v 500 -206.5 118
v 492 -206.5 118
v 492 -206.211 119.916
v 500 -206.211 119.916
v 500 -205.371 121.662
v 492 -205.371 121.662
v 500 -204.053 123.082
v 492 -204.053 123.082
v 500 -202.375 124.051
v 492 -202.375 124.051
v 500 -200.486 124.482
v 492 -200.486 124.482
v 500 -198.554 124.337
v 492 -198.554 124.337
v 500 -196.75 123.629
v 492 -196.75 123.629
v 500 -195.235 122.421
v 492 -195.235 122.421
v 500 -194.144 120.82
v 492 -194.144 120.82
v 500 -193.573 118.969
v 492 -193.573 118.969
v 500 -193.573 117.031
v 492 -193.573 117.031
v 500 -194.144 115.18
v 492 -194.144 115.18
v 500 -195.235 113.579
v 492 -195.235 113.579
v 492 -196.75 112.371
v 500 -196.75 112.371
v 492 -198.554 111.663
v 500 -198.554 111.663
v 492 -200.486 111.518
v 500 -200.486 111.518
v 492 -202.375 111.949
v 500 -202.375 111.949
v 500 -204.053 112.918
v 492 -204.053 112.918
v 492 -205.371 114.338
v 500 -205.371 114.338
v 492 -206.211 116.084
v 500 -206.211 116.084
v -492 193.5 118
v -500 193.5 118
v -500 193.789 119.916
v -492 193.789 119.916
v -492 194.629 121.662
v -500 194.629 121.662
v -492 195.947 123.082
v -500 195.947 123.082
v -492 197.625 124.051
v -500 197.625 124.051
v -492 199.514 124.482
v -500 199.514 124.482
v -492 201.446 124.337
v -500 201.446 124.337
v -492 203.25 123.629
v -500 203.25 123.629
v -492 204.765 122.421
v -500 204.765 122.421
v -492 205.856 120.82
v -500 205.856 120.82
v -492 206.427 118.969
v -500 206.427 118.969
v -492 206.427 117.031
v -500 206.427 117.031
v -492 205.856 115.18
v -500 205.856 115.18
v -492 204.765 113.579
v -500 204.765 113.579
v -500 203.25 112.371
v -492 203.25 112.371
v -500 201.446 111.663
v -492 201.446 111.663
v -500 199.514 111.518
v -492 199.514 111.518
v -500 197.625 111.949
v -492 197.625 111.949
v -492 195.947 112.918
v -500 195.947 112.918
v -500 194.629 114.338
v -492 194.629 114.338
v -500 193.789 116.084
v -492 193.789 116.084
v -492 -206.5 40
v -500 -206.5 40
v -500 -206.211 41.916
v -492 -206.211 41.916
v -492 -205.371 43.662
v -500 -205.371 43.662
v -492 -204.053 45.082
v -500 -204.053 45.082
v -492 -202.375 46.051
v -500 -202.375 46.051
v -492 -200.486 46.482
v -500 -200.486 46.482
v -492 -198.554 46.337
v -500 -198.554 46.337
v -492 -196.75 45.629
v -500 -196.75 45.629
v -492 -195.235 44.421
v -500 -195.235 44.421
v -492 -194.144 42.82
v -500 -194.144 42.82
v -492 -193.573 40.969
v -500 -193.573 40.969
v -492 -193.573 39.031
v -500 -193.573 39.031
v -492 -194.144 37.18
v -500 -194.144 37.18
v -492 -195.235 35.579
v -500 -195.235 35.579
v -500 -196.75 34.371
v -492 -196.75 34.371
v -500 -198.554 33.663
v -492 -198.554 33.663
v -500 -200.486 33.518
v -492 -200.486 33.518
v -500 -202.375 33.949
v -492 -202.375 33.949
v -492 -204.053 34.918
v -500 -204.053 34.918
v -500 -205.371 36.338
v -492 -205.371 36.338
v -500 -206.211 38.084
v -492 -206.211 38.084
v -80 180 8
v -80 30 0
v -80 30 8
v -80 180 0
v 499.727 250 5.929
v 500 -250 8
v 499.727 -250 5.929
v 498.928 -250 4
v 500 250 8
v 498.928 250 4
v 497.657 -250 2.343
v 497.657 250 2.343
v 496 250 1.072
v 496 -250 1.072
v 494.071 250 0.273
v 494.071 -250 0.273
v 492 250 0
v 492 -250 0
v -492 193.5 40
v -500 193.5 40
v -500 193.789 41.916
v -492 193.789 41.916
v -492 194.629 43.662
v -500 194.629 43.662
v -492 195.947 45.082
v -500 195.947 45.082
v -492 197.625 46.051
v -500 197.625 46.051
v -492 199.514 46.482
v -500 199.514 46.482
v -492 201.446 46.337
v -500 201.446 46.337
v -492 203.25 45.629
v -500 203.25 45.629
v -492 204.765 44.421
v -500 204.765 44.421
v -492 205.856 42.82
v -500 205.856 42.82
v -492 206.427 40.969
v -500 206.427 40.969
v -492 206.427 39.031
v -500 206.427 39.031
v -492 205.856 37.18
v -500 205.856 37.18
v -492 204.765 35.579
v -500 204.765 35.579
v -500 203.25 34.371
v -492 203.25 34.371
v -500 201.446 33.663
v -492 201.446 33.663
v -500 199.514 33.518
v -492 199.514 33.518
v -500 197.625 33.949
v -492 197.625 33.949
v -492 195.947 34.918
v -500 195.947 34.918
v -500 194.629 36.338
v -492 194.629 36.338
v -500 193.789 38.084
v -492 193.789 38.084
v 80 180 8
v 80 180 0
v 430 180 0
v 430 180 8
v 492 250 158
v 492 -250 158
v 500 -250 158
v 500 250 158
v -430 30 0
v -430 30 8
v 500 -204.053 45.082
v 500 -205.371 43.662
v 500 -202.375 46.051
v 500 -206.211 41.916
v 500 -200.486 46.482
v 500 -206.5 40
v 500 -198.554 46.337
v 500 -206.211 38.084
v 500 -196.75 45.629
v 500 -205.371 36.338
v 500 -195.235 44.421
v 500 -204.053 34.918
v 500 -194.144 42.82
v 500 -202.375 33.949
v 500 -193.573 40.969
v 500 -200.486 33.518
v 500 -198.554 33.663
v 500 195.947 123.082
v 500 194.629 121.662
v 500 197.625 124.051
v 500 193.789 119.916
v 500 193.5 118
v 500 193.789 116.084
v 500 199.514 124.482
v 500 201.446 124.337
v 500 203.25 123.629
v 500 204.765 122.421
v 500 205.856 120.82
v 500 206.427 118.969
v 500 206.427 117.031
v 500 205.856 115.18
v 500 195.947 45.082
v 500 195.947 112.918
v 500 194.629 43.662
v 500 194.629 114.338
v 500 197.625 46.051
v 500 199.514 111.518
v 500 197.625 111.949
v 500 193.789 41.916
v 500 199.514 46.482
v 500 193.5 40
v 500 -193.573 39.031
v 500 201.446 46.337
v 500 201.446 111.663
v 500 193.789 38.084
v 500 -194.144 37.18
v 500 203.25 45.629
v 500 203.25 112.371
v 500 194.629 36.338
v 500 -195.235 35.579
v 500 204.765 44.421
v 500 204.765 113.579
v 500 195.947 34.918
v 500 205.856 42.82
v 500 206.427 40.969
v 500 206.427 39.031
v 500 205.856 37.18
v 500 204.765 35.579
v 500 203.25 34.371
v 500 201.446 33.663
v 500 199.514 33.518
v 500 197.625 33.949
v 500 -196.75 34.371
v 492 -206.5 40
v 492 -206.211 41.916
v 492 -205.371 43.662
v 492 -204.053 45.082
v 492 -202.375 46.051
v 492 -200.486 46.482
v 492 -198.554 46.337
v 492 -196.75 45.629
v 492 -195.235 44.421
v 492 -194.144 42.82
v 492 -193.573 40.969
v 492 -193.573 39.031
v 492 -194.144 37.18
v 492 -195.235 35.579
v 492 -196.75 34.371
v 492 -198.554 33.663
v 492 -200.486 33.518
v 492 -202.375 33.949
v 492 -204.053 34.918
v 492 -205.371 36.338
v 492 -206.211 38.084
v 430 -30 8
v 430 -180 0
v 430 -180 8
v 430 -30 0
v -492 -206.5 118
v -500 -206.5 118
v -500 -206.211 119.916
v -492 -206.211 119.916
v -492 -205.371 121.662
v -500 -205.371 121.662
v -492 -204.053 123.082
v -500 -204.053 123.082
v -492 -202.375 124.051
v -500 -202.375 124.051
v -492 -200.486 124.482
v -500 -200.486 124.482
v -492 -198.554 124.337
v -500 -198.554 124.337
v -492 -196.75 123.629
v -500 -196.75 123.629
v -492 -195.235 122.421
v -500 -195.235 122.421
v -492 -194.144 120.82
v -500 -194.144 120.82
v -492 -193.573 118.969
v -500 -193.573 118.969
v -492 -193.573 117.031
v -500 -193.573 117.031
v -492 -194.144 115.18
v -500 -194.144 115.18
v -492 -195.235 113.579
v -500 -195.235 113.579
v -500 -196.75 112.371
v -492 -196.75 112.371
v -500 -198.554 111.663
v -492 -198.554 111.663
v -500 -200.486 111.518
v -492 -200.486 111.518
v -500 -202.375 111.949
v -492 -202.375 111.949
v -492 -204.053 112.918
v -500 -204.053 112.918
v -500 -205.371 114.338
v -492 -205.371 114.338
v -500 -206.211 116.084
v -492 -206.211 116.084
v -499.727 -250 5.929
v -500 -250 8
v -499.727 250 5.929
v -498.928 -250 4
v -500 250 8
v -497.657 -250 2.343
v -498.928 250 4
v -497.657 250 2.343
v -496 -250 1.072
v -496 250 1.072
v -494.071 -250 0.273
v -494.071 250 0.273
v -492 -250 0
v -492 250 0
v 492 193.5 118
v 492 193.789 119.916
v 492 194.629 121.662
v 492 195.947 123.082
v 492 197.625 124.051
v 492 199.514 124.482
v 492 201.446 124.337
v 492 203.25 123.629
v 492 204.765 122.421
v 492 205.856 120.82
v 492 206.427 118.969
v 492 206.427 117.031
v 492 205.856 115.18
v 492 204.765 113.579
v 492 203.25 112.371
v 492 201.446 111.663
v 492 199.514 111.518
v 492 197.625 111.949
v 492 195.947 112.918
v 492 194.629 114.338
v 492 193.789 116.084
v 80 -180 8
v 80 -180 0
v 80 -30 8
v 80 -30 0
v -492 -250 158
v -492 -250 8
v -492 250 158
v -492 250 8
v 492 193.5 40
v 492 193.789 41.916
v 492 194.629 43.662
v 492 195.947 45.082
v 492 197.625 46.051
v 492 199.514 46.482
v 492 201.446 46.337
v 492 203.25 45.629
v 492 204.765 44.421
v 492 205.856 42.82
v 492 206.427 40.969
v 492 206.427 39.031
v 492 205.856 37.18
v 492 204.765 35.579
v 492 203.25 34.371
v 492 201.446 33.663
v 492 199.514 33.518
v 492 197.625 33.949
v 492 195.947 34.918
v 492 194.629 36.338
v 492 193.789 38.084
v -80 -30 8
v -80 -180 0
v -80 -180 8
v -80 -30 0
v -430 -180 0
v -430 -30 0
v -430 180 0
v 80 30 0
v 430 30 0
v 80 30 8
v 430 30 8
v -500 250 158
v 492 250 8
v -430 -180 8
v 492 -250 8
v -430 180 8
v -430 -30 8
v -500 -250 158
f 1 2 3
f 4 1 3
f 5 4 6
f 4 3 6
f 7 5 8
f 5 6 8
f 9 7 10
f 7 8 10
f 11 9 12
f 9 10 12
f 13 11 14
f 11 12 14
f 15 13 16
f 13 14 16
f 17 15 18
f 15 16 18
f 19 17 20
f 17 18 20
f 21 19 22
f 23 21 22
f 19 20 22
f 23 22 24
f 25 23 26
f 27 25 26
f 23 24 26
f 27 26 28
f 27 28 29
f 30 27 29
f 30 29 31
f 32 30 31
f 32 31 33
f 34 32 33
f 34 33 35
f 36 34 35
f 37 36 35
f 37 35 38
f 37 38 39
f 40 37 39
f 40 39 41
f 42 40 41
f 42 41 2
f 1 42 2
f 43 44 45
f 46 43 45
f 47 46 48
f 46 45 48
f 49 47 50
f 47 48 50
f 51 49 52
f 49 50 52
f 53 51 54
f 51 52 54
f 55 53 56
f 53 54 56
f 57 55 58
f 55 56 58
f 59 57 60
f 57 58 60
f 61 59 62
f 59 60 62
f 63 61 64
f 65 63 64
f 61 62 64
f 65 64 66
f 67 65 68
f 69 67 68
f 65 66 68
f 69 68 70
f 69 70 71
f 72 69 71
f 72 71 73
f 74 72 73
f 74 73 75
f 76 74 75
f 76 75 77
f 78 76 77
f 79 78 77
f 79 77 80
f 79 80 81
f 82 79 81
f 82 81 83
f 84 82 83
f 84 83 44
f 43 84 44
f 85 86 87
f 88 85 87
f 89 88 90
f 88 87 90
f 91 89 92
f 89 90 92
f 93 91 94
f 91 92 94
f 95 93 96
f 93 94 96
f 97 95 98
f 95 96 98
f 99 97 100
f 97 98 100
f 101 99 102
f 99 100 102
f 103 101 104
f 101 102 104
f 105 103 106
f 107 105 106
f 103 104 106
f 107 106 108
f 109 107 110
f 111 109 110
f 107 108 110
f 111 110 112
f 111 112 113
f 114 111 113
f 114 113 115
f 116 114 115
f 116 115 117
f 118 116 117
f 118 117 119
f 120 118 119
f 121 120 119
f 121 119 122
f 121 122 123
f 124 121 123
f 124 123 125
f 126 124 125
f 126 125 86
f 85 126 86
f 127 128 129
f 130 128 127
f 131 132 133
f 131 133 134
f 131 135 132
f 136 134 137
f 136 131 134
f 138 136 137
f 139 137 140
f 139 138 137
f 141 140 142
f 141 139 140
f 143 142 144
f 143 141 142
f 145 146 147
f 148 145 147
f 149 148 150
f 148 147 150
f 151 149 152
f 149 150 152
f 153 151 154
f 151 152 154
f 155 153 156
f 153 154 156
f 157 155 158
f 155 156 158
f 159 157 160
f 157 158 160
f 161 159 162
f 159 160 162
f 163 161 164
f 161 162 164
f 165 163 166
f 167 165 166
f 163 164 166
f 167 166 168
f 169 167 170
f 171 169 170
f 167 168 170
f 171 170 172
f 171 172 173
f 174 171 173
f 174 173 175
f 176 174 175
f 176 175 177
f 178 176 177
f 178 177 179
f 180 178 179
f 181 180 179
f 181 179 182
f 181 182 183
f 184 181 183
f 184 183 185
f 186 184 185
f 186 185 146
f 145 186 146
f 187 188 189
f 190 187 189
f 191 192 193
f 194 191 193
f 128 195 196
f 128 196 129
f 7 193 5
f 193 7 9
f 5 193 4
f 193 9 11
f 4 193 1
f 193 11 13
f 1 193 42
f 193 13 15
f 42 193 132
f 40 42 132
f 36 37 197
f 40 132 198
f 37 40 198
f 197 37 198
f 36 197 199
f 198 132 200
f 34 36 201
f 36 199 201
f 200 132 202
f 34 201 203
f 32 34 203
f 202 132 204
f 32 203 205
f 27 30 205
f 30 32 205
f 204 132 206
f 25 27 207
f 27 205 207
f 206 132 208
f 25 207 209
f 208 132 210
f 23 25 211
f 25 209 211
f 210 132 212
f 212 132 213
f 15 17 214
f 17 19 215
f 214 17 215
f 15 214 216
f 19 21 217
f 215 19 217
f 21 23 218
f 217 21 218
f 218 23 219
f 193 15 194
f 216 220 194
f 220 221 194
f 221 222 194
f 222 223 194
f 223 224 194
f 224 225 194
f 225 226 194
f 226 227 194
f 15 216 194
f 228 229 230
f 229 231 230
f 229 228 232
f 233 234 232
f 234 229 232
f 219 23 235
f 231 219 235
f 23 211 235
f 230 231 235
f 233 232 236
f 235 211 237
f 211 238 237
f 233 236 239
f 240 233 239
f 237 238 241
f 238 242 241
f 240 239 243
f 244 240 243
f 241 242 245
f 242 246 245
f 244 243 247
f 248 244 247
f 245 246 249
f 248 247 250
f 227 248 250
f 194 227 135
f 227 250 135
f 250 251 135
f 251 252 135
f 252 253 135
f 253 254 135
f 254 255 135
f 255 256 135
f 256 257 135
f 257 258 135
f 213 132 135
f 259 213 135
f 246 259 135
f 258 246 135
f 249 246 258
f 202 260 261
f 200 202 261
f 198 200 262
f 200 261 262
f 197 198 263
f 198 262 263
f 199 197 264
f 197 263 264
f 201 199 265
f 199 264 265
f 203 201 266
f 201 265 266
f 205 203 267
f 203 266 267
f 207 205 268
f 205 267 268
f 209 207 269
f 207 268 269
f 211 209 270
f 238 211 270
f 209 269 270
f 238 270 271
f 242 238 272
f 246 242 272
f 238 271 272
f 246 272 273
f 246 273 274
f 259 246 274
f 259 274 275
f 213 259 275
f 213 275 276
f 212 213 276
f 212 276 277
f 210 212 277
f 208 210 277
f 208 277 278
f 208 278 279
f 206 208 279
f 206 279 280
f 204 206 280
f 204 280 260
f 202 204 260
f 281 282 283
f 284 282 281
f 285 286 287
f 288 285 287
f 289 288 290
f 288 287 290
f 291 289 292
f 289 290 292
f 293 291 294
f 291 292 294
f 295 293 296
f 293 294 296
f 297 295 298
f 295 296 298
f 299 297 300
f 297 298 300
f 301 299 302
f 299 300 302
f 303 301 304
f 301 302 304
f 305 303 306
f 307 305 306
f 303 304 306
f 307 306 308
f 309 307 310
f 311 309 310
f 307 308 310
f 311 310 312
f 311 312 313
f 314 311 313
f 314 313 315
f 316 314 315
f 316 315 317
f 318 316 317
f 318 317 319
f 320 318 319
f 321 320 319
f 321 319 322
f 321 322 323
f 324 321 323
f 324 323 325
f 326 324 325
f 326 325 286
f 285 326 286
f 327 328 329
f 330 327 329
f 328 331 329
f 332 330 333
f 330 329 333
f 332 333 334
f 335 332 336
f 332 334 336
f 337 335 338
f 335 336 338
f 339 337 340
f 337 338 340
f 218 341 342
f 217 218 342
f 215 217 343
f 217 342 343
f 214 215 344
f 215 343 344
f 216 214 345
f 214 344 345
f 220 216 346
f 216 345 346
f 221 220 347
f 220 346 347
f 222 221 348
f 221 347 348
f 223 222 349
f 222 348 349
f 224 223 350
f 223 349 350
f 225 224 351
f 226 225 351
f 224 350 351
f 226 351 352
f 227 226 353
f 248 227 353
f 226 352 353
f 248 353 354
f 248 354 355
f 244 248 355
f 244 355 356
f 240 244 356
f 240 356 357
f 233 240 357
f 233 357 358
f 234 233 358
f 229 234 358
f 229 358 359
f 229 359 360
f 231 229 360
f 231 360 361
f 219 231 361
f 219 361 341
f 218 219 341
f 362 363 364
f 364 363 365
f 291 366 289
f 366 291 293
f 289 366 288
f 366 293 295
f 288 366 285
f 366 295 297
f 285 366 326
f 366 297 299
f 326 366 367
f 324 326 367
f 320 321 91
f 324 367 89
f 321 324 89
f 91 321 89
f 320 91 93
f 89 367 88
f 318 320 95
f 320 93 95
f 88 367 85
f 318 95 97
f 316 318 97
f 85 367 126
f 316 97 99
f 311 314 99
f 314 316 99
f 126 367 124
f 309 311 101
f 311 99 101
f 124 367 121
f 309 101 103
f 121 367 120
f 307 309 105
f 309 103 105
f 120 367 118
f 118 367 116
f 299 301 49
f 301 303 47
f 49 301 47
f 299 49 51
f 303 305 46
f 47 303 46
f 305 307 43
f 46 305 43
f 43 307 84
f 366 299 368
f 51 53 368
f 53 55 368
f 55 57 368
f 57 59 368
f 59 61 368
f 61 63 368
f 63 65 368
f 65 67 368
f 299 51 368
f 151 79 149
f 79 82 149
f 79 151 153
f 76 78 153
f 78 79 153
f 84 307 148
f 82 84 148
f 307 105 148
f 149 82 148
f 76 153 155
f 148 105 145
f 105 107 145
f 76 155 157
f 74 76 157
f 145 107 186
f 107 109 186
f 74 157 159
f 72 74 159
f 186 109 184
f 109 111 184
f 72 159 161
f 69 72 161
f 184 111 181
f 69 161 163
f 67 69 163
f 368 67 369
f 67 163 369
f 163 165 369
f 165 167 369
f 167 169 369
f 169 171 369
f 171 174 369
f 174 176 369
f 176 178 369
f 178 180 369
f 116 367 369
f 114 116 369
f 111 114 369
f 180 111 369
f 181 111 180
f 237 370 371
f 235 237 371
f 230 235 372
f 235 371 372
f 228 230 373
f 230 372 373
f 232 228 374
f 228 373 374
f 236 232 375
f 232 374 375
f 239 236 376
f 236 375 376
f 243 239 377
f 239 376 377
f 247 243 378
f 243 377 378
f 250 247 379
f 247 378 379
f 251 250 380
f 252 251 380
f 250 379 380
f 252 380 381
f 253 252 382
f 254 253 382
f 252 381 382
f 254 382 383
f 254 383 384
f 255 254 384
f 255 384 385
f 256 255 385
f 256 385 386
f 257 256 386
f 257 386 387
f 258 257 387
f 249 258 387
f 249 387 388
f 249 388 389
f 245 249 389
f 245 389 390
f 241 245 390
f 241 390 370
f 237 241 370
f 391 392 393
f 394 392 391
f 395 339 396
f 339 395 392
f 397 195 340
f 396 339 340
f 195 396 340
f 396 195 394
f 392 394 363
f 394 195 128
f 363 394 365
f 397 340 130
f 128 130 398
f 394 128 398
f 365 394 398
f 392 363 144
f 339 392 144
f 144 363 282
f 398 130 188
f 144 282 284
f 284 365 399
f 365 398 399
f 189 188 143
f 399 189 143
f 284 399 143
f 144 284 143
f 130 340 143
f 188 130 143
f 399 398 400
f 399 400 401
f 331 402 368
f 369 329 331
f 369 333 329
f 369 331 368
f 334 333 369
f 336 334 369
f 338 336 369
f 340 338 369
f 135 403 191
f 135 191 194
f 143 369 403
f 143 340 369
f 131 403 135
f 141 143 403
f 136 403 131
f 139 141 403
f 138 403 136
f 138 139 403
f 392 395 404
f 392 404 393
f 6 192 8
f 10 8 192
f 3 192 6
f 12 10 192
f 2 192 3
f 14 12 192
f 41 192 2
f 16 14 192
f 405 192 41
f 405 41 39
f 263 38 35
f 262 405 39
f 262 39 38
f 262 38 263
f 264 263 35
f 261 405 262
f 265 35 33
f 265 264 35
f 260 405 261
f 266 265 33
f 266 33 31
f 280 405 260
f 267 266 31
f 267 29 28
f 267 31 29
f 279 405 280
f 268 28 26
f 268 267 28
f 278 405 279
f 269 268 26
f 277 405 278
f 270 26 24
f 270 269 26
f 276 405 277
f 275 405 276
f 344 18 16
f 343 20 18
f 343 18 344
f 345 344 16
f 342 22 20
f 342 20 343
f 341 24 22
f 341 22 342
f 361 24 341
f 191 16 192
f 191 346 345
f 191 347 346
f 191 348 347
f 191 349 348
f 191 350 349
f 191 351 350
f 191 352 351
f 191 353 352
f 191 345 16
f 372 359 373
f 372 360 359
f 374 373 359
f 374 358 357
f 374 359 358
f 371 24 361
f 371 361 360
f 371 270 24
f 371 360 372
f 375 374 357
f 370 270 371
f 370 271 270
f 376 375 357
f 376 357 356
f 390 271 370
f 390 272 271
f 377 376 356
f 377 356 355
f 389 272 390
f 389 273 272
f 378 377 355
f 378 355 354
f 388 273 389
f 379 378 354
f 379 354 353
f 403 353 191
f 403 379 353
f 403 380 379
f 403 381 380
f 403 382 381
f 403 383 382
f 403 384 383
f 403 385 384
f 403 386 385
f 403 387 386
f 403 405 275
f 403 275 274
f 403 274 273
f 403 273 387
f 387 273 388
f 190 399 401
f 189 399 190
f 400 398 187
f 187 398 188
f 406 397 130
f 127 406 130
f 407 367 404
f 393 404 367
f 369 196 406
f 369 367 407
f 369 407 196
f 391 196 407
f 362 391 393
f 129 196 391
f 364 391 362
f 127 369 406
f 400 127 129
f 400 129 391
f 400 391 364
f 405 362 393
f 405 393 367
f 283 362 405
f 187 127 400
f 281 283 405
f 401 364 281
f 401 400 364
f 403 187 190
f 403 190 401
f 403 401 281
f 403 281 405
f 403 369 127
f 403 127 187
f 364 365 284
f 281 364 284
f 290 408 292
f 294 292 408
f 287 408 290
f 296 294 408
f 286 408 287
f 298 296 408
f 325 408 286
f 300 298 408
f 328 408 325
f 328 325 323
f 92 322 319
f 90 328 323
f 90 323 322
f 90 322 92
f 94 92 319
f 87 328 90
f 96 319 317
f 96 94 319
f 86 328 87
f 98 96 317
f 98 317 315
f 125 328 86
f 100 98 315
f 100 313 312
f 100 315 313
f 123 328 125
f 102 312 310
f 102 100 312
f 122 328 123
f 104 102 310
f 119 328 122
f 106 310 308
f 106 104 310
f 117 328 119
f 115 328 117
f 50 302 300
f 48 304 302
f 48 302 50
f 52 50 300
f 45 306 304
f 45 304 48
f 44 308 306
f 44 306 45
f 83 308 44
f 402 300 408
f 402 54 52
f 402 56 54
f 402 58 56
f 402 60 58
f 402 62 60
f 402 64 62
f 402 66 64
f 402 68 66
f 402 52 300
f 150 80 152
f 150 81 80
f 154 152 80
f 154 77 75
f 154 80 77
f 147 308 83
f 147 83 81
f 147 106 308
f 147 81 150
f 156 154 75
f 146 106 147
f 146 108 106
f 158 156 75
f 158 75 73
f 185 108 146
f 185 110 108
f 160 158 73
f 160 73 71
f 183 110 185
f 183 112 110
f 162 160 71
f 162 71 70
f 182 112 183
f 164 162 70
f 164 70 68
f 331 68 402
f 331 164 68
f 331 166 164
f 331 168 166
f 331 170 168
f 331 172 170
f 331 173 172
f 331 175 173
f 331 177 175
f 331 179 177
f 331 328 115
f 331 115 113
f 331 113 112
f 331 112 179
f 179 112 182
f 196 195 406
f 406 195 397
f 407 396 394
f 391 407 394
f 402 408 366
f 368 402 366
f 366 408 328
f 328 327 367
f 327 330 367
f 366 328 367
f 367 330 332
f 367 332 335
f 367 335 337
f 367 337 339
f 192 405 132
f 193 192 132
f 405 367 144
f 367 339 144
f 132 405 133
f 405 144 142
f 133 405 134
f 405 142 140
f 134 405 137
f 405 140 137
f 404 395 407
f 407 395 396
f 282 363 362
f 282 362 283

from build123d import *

# Parameters (mm, degrees)
F0_W     = 1000
F0_H     = 500
F0_W_2   = 350
F0_H_2   = 150
F1_DEPTH = 8
F2_W     = 8
F2_H     = 500
F3_DEPTH = 150
F4_R     = 8
F5_R     = 6.5
F6_DEPTH = 1200


with BuildPart() as f1:
    # F0 (on Top) → F1 (new body)
    with BuildSketch(Plane.XY):
        Rectangle(F0_W, F0_H)
        with Locations((-255, -105)):
            Rectangle(F0_W_2, F0_H_2, mode=Mode.SUBTRACT)
        with Locations((255, -105)):
            Rectangle(F0_W_2, F0_H_2, mode=Mode.SUBTRACT)
        with Locations((-255, 105)):
            Rectangle(F0_W_2, F0_H_2, mode=Mode.SUBTRACT)
        with Locations((255, 105)):
            Rectangle(F0_W_2, F0_H_2, mode=Mode.SUBTRACT)
    extrude(amount=F1_DEPTH)

    # F2 (on face) → F3 (join)
    with BuildSketch(Plane.XY.offset(8)):
        with Locations((-496, 0)):
            Rectangle(F2_W, F2_H)
        with Locations((496, 0)):
            Rectangle(F2_W, F2_H)
    extrude(amount=F3_DEPTH)

    # F4
    f4_edges = [f1.edges().sort_by_distance(p)[0] for p in [
        (-500, 0, 0),
        (500, 0, 0),
    ]]
    fillet(f4_edges, radius=F4_R)

    # F5 (on face) → F6 (cut)
    with BuildSketch(Plane(origin=(-500, 0, 0), x_dir=(0, -1, 0), z_dir=(-1, 0, 0))):
        with Locations((-200, 40)):
            Circle(F5_R)
        with Locations((-200, 118)):
            Circle(F5_R)
        with Locations((200, 118)):
            Circle(F5_R)
        with Locations((200, 40)):
            Circle(F5_R)
    extrude(amount=-F6_DEPTH, mode=Mode.SUBTRACT)


solid = f1.part
